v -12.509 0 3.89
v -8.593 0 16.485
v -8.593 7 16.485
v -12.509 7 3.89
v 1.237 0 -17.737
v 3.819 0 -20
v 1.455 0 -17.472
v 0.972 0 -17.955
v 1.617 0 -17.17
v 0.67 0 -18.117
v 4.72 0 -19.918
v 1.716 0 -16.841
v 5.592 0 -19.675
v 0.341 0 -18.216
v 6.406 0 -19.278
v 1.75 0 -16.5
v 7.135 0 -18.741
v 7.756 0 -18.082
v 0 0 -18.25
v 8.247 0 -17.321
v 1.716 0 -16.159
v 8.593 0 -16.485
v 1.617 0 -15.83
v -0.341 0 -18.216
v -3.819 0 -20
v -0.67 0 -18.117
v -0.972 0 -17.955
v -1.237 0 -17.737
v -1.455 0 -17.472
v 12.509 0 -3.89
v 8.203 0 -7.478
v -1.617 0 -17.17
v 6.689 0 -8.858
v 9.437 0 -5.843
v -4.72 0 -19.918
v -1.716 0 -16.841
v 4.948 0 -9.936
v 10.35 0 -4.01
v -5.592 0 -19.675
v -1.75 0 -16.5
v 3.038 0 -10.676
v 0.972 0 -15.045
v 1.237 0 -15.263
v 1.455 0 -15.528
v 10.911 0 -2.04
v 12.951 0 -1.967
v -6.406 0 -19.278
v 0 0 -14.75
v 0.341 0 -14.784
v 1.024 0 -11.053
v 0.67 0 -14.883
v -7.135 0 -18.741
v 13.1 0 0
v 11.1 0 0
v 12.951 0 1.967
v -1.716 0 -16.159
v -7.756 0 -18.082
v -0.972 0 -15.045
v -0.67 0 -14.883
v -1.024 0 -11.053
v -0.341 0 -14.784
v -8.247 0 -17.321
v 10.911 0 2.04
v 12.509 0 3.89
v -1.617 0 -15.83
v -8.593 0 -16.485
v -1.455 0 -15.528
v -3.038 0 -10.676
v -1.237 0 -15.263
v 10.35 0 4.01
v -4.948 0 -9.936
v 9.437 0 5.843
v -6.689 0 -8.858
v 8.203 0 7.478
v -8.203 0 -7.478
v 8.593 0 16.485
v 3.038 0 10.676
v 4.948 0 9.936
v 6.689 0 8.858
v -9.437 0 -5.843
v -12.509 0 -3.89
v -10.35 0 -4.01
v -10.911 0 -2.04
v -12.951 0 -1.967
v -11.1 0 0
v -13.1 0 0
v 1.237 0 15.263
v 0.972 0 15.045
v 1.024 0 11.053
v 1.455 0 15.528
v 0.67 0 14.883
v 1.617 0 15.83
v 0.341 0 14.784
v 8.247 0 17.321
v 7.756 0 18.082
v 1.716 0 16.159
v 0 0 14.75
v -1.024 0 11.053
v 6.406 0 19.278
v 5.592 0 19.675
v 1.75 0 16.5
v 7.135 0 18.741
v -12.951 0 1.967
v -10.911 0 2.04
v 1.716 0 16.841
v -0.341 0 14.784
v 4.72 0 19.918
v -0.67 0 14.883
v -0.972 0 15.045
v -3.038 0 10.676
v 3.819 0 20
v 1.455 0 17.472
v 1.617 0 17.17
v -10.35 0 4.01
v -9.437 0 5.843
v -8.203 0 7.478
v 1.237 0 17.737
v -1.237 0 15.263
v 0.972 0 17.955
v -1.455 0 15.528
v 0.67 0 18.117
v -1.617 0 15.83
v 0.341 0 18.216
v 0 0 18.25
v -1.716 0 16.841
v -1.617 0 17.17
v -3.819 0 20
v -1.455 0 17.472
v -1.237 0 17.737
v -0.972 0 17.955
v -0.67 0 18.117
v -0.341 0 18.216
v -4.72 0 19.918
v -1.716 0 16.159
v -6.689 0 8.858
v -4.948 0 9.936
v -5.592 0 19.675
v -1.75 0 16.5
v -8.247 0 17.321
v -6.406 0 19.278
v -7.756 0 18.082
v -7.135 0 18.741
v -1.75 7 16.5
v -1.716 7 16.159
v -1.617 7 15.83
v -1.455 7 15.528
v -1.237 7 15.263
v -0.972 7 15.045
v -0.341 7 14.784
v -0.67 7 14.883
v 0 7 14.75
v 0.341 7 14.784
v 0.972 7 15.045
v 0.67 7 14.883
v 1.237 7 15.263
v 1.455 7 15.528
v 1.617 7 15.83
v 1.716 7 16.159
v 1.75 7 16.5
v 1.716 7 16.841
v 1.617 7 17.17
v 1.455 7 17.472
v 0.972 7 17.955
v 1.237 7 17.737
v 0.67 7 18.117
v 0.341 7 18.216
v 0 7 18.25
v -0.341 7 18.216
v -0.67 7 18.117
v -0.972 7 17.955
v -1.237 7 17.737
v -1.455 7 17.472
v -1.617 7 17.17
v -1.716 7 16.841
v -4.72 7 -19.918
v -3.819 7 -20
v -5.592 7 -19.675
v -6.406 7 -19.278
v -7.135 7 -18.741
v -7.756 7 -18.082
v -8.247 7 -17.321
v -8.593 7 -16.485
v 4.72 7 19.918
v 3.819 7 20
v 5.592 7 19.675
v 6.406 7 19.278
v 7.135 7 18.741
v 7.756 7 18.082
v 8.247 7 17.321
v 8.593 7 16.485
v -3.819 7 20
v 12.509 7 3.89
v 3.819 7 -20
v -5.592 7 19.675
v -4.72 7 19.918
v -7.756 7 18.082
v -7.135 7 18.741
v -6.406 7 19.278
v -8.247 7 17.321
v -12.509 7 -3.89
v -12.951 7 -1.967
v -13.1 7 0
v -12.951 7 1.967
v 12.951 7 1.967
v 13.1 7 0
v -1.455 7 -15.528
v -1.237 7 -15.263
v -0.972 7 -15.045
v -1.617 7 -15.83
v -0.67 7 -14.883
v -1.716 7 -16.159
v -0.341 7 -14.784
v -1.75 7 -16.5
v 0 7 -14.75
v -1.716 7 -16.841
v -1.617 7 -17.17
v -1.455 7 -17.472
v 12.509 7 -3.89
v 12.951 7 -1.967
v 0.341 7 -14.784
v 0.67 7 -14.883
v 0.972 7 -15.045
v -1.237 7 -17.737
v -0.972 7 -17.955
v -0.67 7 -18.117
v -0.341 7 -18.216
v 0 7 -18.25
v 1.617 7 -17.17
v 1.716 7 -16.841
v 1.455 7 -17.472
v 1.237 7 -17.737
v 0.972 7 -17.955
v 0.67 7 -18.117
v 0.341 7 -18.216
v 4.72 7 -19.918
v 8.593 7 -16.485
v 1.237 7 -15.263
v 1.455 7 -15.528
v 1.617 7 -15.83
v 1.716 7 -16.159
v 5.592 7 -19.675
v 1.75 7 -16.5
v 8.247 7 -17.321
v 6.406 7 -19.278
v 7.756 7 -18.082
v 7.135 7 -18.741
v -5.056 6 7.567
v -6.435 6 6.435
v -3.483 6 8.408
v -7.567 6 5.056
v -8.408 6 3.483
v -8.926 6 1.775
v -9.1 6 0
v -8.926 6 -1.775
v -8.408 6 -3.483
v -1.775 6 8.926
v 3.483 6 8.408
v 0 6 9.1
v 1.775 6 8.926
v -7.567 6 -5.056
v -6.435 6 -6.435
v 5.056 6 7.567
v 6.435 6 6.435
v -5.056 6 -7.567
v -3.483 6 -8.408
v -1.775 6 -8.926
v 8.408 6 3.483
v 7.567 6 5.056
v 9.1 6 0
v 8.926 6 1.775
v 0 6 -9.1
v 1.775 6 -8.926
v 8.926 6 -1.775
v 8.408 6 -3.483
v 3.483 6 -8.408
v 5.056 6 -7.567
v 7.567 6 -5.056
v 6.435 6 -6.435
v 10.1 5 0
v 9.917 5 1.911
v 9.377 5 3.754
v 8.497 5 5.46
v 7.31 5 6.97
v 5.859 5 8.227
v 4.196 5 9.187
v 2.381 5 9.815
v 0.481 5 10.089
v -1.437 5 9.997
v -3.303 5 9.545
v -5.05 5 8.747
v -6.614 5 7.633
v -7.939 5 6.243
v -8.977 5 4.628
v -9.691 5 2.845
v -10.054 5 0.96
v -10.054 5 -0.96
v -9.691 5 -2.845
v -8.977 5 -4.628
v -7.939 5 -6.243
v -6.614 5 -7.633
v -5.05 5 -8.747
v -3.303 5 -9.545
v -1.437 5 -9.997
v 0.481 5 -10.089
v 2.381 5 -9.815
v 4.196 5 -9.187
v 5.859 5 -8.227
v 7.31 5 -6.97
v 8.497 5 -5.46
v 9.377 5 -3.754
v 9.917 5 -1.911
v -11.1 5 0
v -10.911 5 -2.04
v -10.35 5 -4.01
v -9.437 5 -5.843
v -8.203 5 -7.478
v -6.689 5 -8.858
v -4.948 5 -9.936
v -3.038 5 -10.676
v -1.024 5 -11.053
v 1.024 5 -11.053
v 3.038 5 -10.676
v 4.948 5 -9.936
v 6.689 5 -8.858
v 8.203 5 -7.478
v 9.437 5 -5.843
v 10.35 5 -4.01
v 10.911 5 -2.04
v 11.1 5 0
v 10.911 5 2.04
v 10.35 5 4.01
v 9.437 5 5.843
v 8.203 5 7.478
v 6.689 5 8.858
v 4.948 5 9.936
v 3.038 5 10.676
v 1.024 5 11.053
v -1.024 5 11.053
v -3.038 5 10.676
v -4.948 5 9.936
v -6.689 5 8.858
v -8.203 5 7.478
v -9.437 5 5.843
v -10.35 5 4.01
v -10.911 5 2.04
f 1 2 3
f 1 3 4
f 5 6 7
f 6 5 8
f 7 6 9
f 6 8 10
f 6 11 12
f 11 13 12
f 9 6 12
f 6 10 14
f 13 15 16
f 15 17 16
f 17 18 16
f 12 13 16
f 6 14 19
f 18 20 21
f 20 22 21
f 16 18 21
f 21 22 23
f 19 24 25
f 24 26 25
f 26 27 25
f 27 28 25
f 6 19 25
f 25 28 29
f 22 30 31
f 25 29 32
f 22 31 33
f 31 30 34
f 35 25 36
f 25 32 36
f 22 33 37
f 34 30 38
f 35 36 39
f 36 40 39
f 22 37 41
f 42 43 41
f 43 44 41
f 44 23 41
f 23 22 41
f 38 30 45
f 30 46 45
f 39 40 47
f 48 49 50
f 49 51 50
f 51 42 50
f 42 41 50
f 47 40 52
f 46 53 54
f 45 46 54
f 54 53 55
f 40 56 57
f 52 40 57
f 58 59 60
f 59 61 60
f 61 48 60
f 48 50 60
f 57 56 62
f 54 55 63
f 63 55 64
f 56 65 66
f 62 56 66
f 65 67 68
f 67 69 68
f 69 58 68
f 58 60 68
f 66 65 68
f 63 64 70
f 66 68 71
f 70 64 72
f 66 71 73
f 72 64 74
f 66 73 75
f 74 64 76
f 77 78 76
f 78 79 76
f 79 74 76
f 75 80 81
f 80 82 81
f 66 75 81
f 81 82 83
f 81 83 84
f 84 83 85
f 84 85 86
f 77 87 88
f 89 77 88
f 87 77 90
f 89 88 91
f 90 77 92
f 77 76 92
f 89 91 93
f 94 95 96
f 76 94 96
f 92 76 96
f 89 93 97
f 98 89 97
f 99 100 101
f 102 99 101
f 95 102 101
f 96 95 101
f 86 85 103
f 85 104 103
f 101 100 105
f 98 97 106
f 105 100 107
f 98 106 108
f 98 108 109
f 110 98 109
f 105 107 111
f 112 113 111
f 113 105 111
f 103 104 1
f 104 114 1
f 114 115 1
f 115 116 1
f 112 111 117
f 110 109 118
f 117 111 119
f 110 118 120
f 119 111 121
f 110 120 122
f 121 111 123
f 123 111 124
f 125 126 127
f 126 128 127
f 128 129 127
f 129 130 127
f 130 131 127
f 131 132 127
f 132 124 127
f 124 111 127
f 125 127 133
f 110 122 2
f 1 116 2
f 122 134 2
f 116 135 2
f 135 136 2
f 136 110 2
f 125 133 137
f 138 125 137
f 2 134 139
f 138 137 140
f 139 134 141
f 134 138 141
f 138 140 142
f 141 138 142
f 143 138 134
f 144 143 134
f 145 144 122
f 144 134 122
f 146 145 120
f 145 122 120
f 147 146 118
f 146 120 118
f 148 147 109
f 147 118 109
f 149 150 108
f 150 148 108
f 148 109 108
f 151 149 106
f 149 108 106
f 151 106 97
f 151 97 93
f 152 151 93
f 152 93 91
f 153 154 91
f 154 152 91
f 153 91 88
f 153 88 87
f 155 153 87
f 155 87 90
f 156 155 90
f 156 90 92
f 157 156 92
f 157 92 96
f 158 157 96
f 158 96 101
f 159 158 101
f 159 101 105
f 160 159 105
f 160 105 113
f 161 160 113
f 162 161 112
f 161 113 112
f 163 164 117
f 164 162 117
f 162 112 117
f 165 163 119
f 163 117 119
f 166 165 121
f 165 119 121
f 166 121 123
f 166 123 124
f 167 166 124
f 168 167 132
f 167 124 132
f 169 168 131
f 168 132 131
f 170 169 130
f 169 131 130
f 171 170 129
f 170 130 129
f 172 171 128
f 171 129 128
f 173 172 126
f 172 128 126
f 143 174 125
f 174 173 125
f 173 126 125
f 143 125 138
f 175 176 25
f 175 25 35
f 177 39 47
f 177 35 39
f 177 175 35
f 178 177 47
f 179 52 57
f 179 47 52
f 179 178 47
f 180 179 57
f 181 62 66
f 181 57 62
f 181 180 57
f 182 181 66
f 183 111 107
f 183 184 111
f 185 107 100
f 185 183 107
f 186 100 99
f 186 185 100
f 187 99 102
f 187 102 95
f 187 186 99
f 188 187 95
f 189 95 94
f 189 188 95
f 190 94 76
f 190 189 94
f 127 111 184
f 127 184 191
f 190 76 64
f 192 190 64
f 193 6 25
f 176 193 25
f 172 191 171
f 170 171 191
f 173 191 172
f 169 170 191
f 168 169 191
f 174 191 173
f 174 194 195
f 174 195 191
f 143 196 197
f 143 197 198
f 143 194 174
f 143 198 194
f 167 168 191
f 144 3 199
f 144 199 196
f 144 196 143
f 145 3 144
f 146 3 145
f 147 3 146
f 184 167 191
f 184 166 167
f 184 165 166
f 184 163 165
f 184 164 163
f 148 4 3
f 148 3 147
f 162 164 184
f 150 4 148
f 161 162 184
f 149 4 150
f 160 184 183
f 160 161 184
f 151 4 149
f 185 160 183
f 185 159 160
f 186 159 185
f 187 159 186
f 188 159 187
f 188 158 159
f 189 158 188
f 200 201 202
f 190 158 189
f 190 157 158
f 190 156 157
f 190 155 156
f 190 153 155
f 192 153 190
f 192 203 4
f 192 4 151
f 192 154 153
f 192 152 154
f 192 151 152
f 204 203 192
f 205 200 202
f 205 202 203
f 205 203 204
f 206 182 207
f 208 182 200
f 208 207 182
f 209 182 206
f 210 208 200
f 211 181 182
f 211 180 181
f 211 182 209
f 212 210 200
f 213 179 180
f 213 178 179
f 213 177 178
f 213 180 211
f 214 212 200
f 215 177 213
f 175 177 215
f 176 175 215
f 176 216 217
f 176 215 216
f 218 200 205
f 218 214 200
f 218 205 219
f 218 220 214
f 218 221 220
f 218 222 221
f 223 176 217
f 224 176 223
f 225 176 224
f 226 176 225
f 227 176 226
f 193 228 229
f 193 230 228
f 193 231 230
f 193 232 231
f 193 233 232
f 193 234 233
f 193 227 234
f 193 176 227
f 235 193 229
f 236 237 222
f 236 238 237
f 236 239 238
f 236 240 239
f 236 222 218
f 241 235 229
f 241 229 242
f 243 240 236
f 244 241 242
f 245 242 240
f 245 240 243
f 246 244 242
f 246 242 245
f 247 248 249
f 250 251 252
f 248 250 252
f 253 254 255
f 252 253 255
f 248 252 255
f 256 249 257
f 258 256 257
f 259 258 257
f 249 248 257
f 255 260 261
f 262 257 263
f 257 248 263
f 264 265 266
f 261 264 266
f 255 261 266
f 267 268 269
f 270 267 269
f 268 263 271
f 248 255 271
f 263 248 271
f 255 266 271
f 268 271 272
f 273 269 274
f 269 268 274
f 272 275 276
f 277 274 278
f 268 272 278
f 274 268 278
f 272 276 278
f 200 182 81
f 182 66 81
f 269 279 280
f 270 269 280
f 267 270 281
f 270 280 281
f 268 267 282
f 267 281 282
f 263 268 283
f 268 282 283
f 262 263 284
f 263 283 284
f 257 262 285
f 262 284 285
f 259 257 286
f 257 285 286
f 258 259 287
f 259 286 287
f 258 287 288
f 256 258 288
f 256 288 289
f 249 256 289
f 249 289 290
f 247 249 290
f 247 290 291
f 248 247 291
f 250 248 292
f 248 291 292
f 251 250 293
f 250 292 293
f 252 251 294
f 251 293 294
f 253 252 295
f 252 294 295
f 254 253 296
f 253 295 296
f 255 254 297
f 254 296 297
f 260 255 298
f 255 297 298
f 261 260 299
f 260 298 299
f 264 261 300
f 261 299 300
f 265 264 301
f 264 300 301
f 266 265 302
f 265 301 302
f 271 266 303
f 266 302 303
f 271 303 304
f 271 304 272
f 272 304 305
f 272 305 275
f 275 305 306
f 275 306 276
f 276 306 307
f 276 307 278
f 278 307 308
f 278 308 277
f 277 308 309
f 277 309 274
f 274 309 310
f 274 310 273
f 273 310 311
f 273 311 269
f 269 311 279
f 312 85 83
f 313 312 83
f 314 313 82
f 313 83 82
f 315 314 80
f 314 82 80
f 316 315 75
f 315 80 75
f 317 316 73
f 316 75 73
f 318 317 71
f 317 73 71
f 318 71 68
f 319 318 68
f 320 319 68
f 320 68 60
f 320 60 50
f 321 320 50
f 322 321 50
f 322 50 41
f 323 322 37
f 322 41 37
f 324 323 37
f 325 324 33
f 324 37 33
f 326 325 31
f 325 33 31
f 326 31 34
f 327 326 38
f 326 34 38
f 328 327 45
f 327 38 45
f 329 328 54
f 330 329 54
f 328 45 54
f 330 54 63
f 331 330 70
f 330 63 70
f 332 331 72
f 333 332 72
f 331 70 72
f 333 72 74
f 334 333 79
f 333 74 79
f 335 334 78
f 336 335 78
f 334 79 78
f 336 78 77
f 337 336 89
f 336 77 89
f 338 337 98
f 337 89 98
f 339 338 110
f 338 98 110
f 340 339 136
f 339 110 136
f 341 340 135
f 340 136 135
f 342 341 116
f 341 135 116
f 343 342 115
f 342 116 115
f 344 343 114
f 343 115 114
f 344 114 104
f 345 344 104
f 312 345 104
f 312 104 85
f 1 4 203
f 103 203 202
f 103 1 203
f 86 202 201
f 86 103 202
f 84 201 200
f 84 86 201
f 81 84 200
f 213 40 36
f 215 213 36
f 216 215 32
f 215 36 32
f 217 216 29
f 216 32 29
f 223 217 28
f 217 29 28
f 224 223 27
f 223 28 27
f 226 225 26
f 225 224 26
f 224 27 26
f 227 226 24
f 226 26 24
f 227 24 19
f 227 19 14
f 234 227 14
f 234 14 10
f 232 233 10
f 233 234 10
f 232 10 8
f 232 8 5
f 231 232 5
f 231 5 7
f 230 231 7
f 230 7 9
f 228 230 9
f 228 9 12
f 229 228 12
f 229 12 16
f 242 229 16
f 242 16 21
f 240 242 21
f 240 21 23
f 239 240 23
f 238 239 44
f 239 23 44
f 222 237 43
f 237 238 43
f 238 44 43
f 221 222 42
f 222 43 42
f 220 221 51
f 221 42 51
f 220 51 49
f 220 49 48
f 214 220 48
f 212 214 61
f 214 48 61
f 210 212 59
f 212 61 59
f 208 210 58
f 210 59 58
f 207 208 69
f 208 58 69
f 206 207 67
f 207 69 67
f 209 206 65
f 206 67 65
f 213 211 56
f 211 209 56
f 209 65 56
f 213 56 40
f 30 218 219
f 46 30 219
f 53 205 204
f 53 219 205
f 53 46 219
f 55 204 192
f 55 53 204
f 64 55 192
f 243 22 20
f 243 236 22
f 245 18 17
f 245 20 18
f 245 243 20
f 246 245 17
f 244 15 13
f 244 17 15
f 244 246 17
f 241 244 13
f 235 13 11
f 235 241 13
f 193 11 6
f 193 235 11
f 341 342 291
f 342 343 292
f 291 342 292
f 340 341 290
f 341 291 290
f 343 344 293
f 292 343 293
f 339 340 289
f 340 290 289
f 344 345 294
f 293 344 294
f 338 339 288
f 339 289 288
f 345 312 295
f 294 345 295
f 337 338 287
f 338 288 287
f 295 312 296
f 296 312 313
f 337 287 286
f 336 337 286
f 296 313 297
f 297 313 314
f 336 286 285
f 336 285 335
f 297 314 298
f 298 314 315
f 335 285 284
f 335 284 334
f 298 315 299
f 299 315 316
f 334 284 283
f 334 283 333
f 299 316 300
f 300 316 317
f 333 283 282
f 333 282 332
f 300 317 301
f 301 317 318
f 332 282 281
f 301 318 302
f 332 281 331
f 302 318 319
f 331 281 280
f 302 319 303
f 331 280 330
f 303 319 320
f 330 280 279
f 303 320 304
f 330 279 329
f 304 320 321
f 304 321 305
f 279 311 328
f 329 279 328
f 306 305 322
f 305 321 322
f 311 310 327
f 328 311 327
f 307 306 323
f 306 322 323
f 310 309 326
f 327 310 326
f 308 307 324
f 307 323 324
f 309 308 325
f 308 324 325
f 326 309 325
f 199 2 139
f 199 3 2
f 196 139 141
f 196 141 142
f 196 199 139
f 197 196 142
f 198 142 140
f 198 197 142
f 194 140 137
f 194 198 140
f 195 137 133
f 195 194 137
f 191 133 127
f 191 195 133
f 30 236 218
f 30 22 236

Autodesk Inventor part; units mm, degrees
ref_plane "YZ Plane" through (0, 0, 0) normal (1, 0, 0) x (0, 1, 0)
ref_plane "XZ Plane" through (0, 0, 0) normal (0, 1, 0) x (-1, 0, 0)
ref_plane "XY Plane" through (0, 0, 0) normal (0, 0, 1) x (1, 0, 0)
sketch "Szkic1" plane through (0, 0, 0) normal (0, 1, 0) x (-1, 0, 0)
  circle A0 centre (0, 0) radius 11.1
  circle A1 centre (0, 0) radius 13.1
  line L0 (-7.5, 20) -> (7.5, 20)
  line L1 (0, 20) -> (0, 0) construction
  line L2 (7.5, 20) -> (12.5093, 3.8895)
  line L3 (-7.5, 20) -> (-12.5093, 3.8895)
  circle A2 centre (0, 16.5) radius 1.75
  line L4 (0, 0) -> (13.1, 0) construction
  line L5 (-7.5, -20) -> (7.5, -20)
  line L6 (0, -20) -> (0, 0) construction
  line L7 (7.5, -20) -> (12.5093, -3.8895)
  line L8 (-7.5, -20) -> (-12.5093, -3.8895)
  circle A3 centre (0, -16.5) radius 1.75
  arc A4 (12.5093, 3.8895) -> (-12.5093, 3.8895) centre (0, 0) ccw
  arc A5 (-12.5093, -3.8895) -> (12.5093, -3.8895) centre (0, 0) ccw
  dimension "d0" = 22.2
  dimension "d1" = 2
  dimension "d2" = 15
  dimension "d3" = 20
  dimension "d7" = 16.5
  dimension "d8" = 3.5
extrude "Wyciągnięcie proste1" add sketch "Szkic1" along normal blind 7
sketch "Szkic2" plane through (0, 7, 0) normal (0, 1, 0) x (1, 0, 0)
  circle A0 centre (0, 0) radius 13.1
  arc A1 (-12.5093, 3.8895) -> (-12.5093, -3.8895) centre (0, 0) ccw construction
  circle A2 centre (0, 0) radius 10.1
  circle A3 centre (0, 0) radius 11.1 construction
  dimension "d16" = 1
extrude "Wyciągnięcie proste2" add sketch "Szkic2" against normal blind 2
fillet "Zaokrąglenie1" radius 5 4 edges at (-7.5, 3.5, 20) (7.5, 3.5, 20) (7.5, 3.5, -20) (-7.5, 3.5, -20)
sketch "Sketch3" plane through (0, 7, 0) normal (0, 1, 0) x (1, 0, 0)
  circle A0 centre (0, 0) radius 10.1 projected
extrude "Extrusion3" add sketch "Sketch3" against normal blind 1
chamfer "Chamfer1" distance 1 angle 45 1 edges at (-10.1, 6, 0)
properties part number "CH_01_0022_bearing_mount"
